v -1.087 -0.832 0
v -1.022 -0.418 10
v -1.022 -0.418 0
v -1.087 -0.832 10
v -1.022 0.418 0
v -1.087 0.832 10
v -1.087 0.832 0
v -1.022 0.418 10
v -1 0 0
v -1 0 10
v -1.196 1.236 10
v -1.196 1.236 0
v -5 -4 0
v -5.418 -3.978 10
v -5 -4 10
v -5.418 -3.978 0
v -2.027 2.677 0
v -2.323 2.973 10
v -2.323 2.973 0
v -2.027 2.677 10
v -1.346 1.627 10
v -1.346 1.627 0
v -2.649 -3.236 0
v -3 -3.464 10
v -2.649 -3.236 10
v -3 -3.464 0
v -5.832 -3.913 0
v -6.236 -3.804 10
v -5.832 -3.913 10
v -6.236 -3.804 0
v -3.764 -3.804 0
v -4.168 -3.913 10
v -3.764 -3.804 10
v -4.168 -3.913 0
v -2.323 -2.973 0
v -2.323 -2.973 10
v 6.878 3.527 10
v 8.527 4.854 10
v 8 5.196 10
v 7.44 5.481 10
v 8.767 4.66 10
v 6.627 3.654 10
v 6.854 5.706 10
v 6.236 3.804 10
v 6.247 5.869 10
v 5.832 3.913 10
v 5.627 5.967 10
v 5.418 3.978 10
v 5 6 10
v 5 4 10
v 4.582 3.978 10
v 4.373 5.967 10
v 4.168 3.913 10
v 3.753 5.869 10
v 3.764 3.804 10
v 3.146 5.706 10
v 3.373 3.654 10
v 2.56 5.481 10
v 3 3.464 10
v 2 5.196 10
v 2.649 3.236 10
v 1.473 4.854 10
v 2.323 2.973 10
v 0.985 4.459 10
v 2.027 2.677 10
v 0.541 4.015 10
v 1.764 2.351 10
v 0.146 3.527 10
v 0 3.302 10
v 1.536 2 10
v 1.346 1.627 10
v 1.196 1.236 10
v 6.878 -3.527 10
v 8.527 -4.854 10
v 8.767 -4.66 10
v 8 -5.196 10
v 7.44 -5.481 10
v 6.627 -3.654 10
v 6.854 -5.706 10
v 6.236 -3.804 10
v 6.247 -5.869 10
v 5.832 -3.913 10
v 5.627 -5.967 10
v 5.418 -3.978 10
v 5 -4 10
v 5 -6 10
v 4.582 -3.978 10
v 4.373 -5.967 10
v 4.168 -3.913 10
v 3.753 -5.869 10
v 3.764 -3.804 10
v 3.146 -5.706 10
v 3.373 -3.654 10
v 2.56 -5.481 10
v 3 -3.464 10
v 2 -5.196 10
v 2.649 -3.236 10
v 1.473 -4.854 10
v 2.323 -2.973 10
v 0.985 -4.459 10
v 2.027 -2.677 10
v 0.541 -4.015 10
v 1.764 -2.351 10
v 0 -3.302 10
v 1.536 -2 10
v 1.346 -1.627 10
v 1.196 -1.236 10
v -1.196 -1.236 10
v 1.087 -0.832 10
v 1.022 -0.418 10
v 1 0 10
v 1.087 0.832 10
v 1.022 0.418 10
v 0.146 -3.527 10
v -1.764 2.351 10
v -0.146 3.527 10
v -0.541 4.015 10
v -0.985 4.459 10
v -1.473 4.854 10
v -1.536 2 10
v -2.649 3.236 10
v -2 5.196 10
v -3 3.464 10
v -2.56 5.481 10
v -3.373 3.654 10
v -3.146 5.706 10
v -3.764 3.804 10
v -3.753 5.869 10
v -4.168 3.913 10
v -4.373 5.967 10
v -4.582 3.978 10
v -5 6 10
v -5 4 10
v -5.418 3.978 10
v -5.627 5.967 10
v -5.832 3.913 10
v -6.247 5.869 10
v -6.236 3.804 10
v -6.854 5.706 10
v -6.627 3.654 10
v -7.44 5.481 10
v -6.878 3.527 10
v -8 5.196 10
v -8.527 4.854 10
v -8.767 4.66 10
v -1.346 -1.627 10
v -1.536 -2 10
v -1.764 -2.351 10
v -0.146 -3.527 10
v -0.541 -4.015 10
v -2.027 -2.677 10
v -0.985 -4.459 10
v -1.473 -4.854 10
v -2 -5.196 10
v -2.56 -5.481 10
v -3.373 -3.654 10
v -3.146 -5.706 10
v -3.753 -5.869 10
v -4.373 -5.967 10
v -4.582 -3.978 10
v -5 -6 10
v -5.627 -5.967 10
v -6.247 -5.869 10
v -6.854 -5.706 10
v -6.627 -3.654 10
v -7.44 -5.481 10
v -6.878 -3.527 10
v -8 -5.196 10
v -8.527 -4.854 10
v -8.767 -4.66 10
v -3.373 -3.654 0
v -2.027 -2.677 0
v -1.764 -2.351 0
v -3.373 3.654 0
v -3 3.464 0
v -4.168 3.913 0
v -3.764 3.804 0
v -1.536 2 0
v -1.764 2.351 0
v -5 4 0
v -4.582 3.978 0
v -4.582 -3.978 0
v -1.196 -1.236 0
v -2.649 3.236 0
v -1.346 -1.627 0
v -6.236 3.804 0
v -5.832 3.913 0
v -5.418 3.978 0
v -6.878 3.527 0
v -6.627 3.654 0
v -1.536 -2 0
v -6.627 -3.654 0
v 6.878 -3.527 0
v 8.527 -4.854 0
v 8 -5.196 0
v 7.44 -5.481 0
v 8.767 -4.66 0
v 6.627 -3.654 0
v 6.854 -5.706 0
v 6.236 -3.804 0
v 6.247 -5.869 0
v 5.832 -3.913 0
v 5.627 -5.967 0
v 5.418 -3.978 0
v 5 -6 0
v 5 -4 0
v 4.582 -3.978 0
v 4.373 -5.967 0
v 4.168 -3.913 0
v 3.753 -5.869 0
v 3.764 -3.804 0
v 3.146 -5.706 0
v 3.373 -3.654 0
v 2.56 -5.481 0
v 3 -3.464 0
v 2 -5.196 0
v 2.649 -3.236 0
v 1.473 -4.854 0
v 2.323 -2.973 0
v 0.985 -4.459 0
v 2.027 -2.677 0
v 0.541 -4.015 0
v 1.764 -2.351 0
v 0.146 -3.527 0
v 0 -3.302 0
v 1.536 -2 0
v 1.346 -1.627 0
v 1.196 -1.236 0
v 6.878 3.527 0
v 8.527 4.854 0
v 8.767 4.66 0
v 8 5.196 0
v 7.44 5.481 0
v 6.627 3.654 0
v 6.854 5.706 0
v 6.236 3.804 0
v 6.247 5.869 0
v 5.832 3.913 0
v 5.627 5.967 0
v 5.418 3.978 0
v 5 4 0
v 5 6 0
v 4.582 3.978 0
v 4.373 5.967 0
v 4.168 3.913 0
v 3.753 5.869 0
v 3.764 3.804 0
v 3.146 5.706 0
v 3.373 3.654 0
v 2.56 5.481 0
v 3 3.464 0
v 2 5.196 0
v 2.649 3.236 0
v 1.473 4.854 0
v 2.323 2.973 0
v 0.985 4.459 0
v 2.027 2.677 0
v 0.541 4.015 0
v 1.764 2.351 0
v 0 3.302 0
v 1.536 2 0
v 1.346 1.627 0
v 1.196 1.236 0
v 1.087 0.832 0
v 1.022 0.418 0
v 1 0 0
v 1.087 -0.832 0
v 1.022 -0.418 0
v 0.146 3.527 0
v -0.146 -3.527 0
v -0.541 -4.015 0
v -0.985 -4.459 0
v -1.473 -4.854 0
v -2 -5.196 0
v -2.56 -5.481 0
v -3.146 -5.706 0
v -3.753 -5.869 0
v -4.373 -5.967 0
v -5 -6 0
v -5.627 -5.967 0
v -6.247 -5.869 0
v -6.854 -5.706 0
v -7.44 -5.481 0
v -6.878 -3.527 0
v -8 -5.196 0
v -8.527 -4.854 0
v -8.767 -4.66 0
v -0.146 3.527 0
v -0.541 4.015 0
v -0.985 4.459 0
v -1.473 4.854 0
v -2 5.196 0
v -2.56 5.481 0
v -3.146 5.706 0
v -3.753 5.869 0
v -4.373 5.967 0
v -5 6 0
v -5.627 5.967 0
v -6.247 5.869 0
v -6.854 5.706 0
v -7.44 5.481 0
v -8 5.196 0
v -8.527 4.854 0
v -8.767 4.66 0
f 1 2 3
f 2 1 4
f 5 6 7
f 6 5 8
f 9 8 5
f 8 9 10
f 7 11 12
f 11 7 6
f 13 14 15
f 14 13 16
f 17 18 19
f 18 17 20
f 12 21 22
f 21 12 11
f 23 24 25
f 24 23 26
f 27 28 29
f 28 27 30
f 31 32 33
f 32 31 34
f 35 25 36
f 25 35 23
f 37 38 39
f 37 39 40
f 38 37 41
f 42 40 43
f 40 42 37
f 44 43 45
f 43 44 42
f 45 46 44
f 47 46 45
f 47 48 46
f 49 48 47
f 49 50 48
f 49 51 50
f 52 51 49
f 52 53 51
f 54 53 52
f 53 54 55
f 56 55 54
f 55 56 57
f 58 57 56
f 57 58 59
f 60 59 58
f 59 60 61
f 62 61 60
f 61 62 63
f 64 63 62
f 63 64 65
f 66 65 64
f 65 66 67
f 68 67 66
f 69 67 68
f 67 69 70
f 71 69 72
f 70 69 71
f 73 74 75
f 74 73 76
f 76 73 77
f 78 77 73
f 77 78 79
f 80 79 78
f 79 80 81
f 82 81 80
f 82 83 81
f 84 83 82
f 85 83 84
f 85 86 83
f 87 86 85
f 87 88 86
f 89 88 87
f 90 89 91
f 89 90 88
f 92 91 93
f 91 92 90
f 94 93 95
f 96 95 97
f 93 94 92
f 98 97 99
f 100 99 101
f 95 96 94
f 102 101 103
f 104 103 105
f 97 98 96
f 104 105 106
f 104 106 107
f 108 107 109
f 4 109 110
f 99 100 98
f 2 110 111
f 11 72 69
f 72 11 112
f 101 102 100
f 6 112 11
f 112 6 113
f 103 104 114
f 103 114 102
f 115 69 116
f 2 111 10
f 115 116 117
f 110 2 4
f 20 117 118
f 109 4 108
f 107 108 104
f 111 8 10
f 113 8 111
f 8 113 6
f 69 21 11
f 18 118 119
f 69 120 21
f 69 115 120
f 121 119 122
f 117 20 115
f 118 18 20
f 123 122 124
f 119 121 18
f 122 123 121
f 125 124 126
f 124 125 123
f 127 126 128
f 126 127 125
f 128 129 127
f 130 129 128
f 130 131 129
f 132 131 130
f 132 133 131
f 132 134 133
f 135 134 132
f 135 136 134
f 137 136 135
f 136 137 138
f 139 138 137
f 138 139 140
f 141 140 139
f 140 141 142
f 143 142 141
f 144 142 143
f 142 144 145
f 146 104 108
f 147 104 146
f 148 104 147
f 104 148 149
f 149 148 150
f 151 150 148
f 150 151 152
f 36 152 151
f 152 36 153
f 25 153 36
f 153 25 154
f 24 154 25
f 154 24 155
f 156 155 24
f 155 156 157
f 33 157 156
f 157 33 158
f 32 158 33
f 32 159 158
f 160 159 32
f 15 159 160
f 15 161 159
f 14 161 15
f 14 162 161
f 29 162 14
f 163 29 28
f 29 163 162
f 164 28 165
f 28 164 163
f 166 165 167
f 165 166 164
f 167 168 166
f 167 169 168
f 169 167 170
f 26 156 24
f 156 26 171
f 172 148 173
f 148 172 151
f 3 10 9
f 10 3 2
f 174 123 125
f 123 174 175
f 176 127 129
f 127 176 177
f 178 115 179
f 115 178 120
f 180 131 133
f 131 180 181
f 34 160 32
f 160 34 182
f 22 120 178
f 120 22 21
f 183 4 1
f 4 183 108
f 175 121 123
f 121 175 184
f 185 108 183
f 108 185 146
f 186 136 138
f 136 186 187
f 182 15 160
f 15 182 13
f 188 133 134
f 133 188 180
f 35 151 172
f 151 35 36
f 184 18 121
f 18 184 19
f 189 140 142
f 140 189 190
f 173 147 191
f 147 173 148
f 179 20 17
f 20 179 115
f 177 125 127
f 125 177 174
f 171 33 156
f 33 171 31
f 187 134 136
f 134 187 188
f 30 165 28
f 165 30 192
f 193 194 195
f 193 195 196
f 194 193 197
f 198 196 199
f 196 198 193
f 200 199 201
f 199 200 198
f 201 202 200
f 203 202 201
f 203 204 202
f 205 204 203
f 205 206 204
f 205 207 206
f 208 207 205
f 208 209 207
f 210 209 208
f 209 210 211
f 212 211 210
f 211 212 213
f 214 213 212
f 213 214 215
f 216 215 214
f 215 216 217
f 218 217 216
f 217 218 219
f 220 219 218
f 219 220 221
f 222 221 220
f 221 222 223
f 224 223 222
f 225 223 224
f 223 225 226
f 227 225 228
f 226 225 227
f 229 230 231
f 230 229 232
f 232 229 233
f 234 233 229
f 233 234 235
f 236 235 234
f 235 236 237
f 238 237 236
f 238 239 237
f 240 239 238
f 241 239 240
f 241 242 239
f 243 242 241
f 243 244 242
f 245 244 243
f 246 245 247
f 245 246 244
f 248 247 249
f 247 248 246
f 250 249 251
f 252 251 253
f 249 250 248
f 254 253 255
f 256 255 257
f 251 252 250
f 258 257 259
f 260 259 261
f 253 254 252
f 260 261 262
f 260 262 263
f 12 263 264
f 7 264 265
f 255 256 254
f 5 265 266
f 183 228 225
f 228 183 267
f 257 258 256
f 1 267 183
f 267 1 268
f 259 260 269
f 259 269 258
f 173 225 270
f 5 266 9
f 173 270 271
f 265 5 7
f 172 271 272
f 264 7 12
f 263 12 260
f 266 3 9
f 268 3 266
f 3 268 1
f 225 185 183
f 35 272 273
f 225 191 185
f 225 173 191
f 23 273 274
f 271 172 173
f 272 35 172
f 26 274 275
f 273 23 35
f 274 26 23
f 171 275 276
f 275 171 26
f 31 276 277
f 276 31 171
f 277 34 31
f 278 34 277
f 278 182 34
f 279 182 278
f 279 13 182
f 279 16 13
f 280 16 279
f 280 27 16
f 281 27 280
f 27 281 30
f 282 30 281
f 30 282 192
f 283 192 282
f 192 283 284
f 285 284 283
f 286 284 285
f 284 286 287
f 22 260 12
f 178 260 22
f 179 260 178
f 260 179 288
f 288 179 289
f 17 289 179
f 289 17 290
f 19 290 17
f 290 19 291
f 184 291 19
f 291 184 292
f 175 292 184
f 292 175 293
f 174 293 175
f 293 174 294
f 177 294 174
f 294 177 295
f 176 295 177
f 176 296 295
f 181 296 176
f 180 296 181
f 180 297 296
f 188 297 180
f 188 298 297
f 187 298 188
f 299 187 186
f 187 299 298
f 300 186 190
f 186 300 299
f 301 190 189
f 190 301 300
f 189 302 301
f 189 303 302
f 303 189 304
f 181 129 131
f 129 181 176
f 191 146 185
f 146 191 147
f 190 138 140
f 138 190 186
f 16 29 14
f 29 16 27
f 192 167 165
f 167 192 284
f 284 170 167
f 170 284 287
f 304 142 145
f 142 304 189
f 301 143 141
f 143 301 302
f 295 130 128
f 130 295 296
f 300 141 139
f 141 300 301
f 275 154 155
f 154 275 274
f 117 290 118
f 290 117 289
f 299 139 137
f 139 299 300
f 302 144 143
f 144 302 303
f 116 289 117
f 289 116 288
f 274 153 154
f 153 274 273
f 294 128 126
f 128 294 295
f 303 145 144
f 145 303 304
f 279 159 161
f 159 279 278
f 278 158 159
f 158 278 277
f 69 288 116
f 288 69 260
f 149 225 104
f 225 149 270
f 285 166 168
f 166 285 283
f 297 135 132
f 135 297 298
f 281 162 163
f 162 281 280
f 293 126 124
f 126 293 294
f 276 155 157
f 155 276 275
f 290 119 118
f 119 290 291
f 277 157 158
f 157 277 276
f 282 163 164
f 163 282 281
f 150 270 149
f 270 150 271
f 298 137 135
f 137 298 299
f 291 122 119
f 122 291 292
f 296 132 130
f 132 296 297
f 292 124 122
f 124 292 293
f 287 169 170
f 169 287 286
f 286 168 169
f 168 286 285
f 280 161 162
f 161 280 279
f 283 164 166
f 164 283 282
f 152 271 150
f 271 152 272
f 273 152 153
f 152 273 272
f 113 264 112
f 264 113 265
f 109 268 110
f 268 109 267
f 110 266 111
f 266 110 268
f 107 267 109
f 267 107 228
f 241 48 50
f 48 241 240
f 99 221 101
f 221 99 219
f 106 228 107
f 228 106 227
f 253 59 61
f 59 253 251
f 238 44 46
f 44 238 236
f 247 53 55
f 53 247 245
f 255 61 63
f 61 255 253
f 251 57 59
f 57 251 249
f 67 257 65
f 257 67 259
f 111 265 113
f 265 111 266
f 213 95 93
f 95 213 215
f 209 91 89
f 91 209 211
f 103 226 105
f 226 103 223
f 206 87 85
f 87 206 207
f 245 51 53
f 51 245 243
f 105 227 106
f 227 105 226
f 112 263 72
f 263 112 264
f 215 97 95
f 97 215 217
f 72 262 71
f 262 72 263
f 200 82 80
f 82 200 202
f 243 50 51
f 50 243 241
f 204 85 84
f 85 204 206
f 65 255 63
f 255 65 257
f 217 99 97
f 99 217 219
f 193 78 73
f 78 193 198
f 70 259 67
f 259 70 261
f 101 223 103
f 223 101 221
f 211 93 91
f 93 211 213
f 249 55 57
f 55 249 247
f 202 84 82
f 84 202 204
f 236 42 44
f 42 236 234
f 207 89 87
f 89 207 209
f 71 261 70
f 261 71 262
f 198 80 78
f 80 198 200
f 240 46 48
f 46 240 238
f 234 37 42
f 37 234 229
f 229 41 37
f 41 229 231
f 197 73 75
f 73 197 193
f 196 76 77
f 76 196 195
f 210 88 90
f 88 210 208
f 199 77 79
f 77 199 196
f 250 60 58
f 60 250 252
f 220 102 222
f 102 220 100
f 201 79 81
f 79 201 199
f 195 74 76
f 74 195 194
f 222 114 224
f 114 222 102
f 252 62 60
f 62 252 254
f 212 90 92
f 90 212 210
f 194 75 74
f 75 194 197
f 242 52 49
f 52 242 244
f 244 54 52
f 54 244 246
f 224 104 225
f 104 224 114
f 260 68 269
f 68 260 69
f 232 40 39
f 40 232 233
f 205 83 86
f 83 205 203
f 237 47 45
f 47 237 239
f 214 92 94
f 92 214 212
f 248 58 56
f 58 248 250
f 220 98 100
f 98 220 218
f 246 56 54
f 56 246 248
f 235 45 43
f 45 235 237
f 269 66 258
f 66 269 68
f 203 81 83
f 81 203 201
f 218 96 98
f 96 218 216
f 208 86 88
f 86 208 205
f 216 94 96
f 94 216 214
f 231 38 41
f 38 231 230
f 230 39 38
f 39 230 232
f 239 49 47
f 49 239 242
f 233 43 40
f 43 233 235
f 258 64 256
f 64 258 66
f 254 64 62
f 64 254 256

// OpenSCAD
// cable_connect
// version 0.0.1
// by pixelhaufen
// is licensed under CC BY-SA 3.0 -> https://creativecommons.org/licenses/by-sa/3.0/

//------------------------------------------------------------------
// User Inputs

cable_diameter = 8; // [4:0.1:15]
clip_height = 10; // [5:25]

/*[Hidden]*/
// speed vs. resolution
$fn = 60; // looks like this can't be modified on thingiverse

cable_radius = cable_diameter/2;

//------------------------------------------------------------------
// Main
rotate([0, 0, 180])
{
    translate([(cable_radius+1)*-1,0,0])
    {
        ring();
    }
}

translate([(cable_radius+1)*-1,0,0])
{
    ring();
}

//------------------------------------------------------------------
// Module

module ring()
{
    difference()
    {
        cylinder(h=clip_height, r1=cable_radius+2, r2=cable_radius+2, center=false);
        
        union()
        {
            cylinder(h=clip_height, r1=cable_radius, r2=cable_radius, center=false);
            linear_extrude(height = clip_height, twist = 0)
            {
                polygon(points=[[cable_radius+0,0], [(cable_radius+2)*-1,cable_radius+2], [(cable_radius+2)*-1,(cable_radius+2)*-1]]);
            }
        }
    }
}
